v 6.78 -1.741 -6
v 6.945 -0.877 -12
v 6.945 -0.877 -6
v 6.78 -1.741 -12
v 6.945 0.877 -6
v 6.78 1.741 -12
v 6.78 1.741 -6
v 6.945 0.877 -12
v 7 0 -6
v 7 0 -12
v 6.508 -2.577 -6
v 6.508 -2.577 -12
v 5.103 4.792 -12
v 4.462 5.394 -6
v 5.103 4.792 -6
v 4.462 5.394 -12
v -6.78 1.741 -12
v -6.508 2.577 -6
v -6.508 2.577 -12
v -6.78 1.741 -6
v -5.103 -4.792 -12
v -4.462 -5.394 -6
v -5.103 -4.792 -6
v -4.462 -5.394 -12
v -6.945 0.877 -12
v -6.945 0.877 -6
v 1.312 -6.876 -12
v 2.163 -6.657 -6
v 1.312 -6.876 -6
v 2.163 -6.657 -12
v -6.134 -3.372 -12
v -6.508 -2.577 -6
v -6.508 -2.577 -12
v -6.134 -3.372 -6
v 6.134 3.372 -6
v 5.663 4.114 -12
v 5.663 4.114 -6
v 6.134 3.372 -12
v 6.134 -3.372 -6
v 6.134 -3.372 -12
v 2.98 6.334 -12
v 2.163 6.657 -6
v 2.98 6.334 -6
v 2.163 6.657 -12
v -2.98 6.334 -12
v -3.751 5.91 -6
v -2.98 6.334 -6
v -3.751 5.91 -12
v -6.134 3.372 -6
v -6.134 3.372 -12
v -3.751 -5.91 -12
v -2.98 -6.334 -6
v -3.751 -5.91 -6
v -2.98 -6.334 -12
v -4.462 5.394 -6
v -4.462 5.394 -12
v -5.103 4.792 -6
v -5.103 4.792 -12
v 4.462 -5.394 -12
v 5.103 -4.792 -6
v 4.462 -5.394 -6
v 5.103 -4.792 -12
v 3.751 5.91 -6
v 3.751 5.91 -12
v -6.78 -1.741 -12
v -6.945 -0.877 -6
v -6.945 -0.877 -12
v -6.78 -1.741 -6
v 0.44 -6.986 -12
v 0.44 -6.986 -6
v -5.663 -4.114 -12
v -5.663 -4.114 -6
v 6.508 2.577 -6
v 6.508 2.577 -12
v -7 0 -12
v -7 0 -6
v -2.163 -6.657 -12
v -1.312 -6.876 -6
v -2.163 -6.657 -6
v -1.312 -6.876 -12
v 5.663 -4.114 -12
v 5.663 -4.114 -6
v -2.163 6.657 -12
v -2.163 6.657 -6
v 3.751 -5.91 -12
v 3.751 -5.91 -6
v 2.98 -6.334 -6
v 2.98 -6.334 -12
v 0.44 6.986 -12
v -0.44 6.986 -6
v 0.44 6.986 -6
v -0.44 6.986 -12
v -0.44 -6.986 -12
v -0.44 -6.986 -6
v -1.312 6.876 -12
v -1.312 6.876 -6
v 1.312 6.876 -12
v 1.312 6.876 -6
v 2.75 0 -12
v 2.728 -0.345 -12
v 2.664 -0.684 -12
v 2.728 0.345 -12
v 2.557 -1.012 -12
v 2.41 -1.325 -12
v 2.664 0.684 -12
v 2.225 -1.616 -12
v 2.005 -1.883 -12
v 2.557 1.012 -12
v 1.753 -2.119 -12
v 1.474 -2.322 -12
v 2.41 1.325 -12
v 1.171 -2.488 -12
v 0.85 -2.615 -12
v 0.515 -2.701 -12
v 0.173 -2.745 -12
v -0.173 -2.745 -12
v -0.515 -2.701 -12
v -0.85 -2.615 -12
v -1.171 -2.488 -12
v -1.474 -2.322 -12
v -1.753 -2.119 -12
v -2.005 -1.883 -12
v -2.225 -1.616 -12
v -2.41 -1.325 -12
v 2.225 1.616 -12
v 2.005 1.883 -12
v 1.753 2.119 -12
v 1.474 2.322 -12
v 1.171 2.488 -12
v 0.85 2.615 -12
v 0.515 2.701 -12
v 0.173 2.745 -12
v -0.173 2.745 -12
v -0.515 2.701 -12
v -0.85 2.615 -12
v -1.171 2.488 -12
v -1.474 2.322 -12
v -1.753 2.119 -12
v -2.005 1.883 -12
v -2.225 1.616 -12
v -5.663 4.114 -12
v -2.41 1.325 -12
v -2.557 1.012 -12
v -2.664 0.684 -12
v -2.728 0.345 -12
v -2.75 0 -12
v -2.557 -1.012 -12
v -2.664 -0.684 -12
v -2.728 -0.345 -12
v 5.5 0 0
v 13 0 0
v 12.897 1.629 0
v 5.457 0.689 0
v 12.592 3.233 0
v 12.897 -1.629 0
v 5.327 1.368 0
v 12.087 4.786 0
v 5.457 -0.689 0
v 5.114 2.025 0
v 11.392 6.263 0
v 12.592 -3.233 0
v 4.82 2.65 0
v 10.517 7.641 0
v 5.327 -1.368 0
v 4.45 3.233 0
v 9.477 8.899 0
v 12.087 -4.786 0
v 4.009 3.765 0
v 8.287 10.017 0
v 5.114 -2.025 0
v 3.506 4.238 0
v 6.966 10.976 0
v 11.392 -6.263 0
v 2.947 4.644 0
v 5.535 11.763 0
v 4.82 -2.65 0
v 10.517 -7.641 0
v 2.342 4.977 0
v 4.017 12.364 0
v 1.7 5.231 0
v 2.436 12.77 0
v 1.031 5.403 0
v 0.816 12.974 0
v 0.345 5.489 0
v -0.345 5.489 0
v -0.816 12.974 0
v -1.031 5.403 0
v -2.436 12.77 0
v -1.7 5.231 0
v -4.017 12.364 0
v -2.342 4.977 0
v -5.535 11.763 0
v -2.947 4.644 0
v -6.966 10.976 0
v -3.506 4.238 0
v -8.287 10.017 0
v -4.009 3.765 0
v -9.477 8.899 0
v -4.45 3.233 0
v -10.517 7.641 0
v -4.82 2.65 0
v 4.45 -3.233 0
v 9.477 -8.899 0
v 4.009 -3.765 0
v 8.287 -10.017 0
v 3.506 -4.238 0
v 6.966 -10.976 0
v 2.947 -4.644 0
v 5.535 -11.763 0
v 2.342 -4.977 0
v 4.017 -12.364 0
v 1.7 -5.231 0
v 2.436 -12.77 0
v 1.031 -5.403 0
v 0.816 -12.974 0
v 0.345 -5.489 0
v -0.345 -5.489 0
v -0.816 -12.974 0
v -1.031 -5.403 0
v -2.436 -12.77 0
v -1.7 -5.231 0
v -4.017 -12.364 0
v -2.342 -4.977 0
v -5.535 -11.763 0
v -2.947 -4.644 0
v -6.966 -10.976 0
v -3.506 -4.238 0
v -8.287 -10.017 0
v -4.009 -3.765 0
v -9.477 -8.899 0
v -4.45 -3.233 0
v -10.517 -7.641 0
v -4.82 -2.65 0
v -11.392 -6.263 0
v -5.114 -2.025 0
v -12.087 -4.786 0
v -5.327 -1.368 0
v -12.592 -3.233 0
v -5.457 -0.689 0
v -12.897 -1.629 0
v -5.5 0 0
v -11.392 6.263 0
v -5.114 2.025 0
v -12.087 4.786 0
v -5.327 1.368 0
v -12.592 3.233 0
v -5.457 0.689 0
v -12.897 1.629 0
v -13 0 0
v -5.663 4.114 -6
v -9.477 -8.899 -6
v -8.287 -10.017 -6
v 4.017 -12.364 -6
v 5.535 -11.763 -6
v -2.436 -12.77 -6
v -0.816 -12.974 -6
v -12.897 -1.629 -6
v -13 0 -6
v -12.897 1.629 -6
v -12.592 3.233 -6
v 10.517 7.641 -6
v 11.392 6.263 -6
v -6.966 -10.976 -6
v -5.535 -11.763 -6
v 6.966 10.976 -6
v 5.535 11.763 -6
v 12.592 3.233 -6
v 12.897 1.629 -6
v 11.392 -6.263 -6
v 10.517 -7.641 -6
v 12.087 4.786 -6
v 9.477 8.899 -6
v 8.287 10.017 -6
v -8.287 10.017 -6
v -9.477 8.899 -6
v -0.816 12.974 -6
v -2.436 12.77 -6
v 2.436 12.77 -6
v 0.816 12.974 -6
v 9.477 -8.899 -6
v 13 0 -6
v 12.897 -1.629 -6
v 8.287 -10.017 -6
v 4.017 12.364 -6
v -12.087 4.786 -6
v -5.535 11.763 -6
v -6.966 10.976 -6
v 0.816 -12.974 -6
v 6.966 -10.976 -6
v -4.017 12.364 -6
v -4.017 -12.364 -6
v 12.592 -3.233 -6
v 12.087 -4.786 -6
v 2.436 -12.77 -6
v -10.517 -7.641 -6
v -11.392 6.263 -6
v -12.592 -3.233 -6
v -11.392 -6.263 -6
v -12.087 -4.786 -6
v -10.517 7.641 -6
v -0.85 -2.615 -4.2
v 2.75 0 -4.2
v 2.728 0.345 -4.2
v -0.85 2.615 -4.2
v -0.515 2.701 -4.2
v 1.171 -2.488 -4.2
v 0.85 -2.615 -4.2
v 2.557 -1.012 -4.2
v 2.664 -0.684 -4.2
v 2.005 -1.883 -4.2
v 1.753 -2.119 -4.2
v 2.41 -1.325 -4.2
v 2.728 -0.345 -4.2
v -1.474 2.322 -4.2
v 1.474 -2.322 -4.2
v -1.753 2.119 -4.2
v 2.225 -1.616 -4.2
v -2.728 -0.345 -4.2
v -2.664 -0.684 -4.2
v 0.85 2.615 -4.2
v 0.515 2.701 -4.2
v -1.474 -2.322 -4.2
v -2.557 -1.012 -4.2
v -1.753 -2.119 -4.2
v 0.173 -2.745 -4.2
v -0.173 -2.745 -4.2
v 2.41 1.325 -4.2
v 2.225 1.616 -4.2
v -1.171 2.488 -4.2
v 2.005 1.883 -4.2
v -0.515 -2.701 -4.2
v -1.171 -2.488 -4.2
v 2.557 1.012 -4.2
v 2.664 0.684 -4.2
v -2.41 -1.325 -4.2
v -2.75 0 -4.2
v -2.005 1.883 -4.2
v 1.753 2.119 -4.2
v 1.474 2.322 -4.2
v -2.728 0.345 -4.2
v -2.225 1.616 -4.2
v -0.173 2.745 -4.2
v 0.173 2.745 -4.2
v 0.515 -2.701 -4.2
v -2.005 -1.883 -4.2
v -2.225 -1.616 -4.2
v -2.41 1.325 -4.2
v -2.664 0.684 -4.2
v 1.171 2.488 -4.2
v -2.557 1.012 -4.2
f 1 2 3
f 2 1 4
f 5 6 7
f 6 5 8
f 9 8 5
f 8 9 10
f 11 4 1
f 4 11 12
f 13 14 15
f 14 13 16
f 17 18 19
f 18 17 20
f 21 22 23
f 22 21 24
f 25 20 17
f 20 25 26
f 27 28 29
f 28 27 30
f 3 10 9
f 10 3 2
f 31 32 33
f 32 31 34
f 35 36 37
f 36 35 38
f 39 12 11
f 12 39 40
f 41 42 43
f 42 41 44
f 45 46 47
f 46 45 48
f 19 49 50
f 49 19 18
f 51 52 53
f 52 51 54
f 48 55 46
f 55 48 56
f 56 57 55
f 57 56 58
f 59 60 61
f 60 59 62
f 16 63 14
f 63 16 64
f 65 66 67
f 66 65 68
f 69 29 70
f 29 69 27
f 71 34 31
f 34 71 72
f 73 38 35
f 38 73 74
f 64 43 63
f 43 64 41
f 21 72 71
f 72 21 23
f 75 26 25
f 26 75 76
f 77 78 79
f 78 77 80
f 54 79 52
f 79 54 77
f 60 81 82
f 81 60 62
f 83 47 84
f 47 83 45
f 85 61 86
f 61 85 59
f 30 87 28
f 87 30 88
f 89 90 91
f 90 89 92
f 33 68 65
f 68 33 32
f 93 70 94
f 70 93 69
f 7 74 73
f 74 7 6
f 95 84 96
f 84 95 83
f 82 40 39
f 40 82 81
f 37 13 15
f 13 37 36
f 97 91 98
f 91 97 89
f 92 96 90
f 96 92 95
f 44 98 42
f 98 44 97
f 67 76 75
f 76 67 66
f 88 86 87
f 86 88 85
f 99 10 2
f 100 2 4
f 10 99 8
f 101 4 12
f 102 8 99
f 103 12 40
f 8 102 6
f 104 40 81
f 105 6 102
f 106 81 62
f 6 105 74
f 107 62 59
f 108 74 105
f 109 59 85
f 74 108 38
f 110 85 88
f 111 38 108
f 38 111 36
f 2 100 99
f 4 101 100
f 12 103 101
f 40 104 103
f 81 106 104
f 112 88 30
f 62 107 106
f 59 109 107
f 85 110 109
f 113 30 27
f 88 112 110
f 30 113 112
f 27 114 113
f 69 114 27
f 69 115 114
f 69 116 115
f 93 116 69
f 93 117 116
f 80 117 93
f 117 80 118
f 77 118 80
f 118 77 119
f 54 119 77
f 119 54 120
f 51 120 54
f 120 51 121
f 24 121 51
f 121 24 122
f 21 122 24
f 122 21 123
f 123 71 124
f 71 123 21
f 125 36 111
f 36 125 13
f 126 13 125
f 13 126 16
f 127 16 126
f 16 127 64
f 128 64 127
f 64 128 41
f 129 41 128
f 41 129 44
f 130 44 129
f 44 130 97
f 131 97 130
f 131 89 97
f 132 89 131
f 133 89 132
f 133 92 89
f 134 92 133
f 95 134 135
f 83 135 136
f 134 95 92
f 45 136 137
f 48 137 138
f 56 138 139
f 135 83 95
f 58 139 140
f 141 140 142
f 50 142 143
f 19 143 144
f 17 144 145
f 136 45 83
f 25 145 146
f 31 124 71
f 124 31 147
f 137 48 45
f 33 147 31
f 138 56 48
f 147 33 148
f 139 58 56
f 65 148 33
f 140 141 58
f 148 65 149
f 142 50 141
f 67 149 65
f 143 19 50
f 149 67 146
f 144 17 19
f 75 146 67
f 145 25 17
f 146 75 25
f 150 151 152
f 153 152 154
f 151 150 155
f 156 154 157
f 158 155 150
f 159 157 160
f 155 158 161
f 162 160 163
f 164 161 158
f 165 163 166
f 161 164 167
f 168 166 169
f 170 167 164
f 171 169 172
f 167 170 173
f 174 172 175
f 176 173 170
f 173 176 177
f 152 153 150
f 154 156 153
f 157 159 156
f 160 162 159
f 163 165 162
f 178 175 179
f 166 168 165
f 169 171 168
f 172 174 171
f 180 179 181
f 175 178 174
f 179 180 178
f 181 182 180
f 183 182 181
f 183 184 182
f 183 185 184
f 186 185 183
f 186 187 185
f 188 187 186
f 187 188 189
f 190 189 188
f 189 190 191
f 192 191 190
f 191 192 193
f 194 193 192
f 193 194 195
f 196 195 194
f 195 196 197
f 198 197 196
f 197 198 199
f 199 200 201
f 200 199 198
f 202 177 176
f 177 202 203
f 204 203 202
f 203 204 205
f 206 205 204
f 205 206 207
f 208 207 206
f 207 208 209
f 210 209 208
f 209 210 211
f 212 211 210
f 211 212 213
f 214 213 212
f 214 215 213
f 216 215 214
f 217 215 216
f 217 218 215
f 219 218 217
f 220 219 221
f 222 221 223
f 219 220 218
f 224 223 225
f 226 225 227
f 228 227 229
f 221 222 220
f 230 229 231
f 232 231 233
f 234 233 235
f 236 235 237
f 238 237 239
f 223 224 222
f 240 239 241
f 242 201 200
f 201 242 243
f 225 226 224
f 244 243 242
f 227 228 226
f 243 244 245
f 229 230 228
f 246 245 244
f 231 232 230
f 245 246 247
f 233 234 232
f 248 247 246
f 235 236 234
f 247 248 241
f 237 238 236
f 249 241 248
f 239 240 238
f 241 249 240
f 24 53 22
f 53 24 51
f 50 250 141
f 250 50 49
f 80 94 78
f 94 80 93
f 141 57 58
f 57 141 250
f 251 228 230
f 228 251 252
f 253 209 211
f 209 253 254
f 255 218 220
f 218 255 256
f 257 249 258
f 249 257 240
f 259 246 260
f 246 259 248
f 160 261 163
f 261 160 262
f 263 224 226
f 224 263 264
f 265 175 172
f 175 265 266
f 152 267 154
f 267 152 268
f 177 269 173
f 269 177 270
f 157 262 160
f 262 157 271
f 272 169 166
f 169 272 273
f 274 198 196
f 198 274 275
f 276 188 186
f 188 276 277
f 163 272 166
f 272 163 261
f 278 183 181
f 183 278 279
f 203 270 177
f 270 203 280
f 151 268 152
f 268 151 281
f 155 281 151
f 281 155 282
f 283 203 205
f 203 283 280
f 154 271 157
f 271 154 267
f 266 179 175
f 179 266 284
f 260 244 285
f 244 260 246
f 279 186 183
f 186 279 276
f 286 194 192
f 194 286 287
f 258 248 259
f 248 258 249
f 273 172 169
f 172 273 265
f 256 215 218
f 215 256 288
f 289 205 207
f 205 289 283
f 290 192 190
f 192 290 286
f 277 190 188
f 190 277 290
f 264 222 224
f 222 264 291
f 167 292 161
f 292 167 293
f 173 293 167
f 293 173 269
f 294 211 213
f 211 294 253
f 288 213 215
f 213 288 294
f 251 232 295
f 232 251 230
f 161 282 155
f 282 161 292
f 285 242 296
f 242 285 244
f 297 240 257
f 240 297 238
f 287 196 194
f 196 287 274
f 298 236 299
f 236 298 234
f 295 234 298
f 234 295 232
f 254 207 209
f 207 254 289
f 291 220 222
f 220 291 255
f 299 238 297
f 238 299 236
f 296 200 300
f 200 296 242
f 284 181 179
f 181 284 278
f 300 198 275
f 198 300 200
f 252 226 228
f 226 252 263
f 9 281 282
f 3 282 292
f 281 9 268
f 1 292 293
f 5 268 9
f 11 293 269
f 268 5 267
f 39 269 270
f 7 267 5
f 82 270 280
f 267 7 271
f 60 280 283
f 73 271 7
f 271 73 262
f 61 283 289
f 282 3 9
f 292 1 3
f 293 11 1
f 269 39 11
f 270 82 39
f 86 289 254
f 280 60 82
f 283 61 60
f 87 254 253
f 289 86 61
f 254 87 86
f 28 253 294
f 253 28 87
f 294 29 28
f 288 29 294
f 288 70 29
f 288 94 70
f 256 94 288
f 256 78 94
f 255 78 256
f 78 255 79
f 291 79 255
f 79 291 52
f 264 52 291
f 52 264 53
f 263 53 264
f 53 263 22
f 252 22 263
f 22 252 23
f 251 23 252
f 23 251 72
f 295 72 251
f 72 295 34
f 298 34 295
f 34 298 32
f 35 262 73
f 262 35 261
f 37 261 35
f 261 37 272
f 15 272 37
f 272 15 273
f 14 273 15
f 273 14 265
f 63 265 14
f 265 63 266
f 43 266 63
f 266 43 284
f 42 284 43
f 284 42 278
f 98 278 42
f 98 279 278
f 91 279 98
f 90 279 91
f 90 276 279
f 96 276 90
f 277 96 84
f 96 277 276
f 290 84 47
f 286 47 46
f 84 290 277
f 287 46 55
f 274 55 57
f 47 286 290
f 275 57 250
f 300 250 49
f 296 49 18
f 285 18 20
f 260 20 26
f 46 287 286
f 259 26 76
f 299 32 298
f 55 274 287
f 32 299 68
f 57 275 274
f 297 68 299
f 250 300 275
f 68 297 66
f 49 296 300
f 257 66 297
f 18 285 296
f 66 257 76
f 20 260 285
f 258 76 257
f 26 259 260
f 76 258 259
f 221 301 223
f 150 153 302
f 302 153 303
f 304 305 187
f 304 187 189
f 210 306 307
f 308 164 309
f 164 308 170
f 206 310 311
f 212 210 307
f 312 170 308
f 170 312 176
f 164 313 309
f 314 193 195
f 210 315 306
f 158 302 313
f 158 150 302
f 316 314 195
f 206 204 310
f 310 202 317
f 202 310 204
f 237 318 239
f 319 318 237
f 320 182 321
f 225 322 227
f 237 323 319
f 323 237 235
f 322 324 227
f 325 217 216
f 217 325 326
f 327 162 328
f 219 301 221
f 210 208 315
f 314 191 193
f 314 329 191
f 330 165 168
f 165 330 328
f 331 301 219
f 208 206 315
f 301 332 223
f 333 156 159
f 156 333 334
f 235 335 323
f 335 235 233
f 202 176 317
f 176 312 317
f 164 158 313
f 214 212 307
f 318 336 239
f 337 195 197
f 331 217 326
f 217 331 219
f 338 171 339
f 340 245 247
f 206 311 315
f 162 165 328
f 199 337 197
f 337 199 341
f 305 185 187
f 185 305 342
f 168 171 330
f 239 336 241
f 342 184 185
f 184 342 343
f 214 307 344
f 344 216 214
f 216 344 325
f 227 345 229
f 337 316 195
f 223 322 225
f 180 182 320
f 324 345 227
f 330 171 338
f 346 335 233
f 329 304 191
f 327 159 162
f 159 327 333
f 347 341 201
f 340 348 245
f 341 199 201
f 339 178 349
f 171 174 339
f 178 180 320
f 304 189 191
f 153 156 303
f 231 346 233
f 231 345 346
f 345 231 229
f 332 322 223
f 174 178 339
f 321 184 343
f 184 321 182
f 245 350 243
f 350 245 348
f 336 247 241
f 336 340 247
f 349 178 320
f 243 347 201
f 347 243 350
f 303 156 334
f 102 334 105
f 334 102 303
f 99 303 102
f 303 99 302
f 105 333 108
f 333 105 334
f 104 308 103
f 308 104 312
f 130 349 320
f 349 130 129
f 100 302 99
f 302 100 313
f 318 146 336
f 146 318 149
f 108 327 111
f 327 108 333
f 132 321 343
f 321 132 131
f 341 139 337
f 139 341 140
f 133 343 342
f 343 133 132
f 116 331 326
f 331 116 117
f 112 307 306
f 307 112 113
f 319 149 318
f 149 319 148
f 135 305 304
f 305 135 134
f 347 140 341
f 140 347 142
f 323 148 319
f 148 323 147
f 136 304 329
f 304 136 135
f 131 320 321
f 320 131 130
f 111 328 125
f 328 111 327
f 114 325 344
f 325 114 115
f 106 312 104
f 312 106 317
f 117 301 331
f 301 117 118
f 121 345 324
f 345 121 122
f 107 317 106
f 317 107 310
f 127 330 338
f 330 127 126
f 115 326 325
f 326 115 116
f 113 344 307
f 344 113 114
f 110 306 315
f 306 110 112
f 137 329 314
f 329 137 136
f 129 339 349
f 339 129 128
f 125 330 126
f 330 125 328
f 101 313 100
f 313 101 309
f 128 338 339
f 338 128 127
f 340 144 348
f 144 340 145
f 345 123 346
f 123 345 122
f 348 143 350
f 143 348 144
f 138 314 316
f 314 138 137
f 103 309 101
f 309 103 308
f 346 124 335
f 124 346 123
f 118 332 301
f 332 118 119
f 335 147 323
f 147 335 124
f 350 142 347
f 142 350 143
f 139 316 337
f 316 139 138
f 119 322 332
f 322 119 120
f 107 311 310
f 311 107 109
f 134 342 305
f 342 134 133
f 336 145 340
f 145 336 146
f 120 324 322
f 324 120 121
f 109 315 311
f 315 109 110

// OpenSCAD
$fn = 50;


difference() {
	union() {
		translate(v = [0, 0, -12.0000000000]) {
			cylinder(h = 12, r = 7.0000000000);
		}
		translate(v = [0, 0, -6.0000000000]) {
			cylinder(h = 6, r = 13.0000000000);
		}
	}
	union() {
		translate(v = [0, 0, 0]) {
			rotate(a = [0, 0, 0]) {
				difference() {
					union() {
						#translate(v = [0, 0, -12.0000000000]) {
							cylinder(h = 12, r = 2.2500000000);
						}
						#translate(v = [0, 0, -4.2000000000]) {
							cylinder(h = 4.2000000000, r = 7.0000000000, r1 = 2.7500000000, r2 = 5.5000000000);
						}
						#translate(v = [0, 0, -12.0000000000]) {
							cylinder(h = 12, r = 2.7500000000);
						}
						#translate(v = [0, 0, -12.0000000000]) {
							cylinder(h = 12, r = 2.2500000000);
						}
					}
					union();
				}
			}
		}
	}
}
